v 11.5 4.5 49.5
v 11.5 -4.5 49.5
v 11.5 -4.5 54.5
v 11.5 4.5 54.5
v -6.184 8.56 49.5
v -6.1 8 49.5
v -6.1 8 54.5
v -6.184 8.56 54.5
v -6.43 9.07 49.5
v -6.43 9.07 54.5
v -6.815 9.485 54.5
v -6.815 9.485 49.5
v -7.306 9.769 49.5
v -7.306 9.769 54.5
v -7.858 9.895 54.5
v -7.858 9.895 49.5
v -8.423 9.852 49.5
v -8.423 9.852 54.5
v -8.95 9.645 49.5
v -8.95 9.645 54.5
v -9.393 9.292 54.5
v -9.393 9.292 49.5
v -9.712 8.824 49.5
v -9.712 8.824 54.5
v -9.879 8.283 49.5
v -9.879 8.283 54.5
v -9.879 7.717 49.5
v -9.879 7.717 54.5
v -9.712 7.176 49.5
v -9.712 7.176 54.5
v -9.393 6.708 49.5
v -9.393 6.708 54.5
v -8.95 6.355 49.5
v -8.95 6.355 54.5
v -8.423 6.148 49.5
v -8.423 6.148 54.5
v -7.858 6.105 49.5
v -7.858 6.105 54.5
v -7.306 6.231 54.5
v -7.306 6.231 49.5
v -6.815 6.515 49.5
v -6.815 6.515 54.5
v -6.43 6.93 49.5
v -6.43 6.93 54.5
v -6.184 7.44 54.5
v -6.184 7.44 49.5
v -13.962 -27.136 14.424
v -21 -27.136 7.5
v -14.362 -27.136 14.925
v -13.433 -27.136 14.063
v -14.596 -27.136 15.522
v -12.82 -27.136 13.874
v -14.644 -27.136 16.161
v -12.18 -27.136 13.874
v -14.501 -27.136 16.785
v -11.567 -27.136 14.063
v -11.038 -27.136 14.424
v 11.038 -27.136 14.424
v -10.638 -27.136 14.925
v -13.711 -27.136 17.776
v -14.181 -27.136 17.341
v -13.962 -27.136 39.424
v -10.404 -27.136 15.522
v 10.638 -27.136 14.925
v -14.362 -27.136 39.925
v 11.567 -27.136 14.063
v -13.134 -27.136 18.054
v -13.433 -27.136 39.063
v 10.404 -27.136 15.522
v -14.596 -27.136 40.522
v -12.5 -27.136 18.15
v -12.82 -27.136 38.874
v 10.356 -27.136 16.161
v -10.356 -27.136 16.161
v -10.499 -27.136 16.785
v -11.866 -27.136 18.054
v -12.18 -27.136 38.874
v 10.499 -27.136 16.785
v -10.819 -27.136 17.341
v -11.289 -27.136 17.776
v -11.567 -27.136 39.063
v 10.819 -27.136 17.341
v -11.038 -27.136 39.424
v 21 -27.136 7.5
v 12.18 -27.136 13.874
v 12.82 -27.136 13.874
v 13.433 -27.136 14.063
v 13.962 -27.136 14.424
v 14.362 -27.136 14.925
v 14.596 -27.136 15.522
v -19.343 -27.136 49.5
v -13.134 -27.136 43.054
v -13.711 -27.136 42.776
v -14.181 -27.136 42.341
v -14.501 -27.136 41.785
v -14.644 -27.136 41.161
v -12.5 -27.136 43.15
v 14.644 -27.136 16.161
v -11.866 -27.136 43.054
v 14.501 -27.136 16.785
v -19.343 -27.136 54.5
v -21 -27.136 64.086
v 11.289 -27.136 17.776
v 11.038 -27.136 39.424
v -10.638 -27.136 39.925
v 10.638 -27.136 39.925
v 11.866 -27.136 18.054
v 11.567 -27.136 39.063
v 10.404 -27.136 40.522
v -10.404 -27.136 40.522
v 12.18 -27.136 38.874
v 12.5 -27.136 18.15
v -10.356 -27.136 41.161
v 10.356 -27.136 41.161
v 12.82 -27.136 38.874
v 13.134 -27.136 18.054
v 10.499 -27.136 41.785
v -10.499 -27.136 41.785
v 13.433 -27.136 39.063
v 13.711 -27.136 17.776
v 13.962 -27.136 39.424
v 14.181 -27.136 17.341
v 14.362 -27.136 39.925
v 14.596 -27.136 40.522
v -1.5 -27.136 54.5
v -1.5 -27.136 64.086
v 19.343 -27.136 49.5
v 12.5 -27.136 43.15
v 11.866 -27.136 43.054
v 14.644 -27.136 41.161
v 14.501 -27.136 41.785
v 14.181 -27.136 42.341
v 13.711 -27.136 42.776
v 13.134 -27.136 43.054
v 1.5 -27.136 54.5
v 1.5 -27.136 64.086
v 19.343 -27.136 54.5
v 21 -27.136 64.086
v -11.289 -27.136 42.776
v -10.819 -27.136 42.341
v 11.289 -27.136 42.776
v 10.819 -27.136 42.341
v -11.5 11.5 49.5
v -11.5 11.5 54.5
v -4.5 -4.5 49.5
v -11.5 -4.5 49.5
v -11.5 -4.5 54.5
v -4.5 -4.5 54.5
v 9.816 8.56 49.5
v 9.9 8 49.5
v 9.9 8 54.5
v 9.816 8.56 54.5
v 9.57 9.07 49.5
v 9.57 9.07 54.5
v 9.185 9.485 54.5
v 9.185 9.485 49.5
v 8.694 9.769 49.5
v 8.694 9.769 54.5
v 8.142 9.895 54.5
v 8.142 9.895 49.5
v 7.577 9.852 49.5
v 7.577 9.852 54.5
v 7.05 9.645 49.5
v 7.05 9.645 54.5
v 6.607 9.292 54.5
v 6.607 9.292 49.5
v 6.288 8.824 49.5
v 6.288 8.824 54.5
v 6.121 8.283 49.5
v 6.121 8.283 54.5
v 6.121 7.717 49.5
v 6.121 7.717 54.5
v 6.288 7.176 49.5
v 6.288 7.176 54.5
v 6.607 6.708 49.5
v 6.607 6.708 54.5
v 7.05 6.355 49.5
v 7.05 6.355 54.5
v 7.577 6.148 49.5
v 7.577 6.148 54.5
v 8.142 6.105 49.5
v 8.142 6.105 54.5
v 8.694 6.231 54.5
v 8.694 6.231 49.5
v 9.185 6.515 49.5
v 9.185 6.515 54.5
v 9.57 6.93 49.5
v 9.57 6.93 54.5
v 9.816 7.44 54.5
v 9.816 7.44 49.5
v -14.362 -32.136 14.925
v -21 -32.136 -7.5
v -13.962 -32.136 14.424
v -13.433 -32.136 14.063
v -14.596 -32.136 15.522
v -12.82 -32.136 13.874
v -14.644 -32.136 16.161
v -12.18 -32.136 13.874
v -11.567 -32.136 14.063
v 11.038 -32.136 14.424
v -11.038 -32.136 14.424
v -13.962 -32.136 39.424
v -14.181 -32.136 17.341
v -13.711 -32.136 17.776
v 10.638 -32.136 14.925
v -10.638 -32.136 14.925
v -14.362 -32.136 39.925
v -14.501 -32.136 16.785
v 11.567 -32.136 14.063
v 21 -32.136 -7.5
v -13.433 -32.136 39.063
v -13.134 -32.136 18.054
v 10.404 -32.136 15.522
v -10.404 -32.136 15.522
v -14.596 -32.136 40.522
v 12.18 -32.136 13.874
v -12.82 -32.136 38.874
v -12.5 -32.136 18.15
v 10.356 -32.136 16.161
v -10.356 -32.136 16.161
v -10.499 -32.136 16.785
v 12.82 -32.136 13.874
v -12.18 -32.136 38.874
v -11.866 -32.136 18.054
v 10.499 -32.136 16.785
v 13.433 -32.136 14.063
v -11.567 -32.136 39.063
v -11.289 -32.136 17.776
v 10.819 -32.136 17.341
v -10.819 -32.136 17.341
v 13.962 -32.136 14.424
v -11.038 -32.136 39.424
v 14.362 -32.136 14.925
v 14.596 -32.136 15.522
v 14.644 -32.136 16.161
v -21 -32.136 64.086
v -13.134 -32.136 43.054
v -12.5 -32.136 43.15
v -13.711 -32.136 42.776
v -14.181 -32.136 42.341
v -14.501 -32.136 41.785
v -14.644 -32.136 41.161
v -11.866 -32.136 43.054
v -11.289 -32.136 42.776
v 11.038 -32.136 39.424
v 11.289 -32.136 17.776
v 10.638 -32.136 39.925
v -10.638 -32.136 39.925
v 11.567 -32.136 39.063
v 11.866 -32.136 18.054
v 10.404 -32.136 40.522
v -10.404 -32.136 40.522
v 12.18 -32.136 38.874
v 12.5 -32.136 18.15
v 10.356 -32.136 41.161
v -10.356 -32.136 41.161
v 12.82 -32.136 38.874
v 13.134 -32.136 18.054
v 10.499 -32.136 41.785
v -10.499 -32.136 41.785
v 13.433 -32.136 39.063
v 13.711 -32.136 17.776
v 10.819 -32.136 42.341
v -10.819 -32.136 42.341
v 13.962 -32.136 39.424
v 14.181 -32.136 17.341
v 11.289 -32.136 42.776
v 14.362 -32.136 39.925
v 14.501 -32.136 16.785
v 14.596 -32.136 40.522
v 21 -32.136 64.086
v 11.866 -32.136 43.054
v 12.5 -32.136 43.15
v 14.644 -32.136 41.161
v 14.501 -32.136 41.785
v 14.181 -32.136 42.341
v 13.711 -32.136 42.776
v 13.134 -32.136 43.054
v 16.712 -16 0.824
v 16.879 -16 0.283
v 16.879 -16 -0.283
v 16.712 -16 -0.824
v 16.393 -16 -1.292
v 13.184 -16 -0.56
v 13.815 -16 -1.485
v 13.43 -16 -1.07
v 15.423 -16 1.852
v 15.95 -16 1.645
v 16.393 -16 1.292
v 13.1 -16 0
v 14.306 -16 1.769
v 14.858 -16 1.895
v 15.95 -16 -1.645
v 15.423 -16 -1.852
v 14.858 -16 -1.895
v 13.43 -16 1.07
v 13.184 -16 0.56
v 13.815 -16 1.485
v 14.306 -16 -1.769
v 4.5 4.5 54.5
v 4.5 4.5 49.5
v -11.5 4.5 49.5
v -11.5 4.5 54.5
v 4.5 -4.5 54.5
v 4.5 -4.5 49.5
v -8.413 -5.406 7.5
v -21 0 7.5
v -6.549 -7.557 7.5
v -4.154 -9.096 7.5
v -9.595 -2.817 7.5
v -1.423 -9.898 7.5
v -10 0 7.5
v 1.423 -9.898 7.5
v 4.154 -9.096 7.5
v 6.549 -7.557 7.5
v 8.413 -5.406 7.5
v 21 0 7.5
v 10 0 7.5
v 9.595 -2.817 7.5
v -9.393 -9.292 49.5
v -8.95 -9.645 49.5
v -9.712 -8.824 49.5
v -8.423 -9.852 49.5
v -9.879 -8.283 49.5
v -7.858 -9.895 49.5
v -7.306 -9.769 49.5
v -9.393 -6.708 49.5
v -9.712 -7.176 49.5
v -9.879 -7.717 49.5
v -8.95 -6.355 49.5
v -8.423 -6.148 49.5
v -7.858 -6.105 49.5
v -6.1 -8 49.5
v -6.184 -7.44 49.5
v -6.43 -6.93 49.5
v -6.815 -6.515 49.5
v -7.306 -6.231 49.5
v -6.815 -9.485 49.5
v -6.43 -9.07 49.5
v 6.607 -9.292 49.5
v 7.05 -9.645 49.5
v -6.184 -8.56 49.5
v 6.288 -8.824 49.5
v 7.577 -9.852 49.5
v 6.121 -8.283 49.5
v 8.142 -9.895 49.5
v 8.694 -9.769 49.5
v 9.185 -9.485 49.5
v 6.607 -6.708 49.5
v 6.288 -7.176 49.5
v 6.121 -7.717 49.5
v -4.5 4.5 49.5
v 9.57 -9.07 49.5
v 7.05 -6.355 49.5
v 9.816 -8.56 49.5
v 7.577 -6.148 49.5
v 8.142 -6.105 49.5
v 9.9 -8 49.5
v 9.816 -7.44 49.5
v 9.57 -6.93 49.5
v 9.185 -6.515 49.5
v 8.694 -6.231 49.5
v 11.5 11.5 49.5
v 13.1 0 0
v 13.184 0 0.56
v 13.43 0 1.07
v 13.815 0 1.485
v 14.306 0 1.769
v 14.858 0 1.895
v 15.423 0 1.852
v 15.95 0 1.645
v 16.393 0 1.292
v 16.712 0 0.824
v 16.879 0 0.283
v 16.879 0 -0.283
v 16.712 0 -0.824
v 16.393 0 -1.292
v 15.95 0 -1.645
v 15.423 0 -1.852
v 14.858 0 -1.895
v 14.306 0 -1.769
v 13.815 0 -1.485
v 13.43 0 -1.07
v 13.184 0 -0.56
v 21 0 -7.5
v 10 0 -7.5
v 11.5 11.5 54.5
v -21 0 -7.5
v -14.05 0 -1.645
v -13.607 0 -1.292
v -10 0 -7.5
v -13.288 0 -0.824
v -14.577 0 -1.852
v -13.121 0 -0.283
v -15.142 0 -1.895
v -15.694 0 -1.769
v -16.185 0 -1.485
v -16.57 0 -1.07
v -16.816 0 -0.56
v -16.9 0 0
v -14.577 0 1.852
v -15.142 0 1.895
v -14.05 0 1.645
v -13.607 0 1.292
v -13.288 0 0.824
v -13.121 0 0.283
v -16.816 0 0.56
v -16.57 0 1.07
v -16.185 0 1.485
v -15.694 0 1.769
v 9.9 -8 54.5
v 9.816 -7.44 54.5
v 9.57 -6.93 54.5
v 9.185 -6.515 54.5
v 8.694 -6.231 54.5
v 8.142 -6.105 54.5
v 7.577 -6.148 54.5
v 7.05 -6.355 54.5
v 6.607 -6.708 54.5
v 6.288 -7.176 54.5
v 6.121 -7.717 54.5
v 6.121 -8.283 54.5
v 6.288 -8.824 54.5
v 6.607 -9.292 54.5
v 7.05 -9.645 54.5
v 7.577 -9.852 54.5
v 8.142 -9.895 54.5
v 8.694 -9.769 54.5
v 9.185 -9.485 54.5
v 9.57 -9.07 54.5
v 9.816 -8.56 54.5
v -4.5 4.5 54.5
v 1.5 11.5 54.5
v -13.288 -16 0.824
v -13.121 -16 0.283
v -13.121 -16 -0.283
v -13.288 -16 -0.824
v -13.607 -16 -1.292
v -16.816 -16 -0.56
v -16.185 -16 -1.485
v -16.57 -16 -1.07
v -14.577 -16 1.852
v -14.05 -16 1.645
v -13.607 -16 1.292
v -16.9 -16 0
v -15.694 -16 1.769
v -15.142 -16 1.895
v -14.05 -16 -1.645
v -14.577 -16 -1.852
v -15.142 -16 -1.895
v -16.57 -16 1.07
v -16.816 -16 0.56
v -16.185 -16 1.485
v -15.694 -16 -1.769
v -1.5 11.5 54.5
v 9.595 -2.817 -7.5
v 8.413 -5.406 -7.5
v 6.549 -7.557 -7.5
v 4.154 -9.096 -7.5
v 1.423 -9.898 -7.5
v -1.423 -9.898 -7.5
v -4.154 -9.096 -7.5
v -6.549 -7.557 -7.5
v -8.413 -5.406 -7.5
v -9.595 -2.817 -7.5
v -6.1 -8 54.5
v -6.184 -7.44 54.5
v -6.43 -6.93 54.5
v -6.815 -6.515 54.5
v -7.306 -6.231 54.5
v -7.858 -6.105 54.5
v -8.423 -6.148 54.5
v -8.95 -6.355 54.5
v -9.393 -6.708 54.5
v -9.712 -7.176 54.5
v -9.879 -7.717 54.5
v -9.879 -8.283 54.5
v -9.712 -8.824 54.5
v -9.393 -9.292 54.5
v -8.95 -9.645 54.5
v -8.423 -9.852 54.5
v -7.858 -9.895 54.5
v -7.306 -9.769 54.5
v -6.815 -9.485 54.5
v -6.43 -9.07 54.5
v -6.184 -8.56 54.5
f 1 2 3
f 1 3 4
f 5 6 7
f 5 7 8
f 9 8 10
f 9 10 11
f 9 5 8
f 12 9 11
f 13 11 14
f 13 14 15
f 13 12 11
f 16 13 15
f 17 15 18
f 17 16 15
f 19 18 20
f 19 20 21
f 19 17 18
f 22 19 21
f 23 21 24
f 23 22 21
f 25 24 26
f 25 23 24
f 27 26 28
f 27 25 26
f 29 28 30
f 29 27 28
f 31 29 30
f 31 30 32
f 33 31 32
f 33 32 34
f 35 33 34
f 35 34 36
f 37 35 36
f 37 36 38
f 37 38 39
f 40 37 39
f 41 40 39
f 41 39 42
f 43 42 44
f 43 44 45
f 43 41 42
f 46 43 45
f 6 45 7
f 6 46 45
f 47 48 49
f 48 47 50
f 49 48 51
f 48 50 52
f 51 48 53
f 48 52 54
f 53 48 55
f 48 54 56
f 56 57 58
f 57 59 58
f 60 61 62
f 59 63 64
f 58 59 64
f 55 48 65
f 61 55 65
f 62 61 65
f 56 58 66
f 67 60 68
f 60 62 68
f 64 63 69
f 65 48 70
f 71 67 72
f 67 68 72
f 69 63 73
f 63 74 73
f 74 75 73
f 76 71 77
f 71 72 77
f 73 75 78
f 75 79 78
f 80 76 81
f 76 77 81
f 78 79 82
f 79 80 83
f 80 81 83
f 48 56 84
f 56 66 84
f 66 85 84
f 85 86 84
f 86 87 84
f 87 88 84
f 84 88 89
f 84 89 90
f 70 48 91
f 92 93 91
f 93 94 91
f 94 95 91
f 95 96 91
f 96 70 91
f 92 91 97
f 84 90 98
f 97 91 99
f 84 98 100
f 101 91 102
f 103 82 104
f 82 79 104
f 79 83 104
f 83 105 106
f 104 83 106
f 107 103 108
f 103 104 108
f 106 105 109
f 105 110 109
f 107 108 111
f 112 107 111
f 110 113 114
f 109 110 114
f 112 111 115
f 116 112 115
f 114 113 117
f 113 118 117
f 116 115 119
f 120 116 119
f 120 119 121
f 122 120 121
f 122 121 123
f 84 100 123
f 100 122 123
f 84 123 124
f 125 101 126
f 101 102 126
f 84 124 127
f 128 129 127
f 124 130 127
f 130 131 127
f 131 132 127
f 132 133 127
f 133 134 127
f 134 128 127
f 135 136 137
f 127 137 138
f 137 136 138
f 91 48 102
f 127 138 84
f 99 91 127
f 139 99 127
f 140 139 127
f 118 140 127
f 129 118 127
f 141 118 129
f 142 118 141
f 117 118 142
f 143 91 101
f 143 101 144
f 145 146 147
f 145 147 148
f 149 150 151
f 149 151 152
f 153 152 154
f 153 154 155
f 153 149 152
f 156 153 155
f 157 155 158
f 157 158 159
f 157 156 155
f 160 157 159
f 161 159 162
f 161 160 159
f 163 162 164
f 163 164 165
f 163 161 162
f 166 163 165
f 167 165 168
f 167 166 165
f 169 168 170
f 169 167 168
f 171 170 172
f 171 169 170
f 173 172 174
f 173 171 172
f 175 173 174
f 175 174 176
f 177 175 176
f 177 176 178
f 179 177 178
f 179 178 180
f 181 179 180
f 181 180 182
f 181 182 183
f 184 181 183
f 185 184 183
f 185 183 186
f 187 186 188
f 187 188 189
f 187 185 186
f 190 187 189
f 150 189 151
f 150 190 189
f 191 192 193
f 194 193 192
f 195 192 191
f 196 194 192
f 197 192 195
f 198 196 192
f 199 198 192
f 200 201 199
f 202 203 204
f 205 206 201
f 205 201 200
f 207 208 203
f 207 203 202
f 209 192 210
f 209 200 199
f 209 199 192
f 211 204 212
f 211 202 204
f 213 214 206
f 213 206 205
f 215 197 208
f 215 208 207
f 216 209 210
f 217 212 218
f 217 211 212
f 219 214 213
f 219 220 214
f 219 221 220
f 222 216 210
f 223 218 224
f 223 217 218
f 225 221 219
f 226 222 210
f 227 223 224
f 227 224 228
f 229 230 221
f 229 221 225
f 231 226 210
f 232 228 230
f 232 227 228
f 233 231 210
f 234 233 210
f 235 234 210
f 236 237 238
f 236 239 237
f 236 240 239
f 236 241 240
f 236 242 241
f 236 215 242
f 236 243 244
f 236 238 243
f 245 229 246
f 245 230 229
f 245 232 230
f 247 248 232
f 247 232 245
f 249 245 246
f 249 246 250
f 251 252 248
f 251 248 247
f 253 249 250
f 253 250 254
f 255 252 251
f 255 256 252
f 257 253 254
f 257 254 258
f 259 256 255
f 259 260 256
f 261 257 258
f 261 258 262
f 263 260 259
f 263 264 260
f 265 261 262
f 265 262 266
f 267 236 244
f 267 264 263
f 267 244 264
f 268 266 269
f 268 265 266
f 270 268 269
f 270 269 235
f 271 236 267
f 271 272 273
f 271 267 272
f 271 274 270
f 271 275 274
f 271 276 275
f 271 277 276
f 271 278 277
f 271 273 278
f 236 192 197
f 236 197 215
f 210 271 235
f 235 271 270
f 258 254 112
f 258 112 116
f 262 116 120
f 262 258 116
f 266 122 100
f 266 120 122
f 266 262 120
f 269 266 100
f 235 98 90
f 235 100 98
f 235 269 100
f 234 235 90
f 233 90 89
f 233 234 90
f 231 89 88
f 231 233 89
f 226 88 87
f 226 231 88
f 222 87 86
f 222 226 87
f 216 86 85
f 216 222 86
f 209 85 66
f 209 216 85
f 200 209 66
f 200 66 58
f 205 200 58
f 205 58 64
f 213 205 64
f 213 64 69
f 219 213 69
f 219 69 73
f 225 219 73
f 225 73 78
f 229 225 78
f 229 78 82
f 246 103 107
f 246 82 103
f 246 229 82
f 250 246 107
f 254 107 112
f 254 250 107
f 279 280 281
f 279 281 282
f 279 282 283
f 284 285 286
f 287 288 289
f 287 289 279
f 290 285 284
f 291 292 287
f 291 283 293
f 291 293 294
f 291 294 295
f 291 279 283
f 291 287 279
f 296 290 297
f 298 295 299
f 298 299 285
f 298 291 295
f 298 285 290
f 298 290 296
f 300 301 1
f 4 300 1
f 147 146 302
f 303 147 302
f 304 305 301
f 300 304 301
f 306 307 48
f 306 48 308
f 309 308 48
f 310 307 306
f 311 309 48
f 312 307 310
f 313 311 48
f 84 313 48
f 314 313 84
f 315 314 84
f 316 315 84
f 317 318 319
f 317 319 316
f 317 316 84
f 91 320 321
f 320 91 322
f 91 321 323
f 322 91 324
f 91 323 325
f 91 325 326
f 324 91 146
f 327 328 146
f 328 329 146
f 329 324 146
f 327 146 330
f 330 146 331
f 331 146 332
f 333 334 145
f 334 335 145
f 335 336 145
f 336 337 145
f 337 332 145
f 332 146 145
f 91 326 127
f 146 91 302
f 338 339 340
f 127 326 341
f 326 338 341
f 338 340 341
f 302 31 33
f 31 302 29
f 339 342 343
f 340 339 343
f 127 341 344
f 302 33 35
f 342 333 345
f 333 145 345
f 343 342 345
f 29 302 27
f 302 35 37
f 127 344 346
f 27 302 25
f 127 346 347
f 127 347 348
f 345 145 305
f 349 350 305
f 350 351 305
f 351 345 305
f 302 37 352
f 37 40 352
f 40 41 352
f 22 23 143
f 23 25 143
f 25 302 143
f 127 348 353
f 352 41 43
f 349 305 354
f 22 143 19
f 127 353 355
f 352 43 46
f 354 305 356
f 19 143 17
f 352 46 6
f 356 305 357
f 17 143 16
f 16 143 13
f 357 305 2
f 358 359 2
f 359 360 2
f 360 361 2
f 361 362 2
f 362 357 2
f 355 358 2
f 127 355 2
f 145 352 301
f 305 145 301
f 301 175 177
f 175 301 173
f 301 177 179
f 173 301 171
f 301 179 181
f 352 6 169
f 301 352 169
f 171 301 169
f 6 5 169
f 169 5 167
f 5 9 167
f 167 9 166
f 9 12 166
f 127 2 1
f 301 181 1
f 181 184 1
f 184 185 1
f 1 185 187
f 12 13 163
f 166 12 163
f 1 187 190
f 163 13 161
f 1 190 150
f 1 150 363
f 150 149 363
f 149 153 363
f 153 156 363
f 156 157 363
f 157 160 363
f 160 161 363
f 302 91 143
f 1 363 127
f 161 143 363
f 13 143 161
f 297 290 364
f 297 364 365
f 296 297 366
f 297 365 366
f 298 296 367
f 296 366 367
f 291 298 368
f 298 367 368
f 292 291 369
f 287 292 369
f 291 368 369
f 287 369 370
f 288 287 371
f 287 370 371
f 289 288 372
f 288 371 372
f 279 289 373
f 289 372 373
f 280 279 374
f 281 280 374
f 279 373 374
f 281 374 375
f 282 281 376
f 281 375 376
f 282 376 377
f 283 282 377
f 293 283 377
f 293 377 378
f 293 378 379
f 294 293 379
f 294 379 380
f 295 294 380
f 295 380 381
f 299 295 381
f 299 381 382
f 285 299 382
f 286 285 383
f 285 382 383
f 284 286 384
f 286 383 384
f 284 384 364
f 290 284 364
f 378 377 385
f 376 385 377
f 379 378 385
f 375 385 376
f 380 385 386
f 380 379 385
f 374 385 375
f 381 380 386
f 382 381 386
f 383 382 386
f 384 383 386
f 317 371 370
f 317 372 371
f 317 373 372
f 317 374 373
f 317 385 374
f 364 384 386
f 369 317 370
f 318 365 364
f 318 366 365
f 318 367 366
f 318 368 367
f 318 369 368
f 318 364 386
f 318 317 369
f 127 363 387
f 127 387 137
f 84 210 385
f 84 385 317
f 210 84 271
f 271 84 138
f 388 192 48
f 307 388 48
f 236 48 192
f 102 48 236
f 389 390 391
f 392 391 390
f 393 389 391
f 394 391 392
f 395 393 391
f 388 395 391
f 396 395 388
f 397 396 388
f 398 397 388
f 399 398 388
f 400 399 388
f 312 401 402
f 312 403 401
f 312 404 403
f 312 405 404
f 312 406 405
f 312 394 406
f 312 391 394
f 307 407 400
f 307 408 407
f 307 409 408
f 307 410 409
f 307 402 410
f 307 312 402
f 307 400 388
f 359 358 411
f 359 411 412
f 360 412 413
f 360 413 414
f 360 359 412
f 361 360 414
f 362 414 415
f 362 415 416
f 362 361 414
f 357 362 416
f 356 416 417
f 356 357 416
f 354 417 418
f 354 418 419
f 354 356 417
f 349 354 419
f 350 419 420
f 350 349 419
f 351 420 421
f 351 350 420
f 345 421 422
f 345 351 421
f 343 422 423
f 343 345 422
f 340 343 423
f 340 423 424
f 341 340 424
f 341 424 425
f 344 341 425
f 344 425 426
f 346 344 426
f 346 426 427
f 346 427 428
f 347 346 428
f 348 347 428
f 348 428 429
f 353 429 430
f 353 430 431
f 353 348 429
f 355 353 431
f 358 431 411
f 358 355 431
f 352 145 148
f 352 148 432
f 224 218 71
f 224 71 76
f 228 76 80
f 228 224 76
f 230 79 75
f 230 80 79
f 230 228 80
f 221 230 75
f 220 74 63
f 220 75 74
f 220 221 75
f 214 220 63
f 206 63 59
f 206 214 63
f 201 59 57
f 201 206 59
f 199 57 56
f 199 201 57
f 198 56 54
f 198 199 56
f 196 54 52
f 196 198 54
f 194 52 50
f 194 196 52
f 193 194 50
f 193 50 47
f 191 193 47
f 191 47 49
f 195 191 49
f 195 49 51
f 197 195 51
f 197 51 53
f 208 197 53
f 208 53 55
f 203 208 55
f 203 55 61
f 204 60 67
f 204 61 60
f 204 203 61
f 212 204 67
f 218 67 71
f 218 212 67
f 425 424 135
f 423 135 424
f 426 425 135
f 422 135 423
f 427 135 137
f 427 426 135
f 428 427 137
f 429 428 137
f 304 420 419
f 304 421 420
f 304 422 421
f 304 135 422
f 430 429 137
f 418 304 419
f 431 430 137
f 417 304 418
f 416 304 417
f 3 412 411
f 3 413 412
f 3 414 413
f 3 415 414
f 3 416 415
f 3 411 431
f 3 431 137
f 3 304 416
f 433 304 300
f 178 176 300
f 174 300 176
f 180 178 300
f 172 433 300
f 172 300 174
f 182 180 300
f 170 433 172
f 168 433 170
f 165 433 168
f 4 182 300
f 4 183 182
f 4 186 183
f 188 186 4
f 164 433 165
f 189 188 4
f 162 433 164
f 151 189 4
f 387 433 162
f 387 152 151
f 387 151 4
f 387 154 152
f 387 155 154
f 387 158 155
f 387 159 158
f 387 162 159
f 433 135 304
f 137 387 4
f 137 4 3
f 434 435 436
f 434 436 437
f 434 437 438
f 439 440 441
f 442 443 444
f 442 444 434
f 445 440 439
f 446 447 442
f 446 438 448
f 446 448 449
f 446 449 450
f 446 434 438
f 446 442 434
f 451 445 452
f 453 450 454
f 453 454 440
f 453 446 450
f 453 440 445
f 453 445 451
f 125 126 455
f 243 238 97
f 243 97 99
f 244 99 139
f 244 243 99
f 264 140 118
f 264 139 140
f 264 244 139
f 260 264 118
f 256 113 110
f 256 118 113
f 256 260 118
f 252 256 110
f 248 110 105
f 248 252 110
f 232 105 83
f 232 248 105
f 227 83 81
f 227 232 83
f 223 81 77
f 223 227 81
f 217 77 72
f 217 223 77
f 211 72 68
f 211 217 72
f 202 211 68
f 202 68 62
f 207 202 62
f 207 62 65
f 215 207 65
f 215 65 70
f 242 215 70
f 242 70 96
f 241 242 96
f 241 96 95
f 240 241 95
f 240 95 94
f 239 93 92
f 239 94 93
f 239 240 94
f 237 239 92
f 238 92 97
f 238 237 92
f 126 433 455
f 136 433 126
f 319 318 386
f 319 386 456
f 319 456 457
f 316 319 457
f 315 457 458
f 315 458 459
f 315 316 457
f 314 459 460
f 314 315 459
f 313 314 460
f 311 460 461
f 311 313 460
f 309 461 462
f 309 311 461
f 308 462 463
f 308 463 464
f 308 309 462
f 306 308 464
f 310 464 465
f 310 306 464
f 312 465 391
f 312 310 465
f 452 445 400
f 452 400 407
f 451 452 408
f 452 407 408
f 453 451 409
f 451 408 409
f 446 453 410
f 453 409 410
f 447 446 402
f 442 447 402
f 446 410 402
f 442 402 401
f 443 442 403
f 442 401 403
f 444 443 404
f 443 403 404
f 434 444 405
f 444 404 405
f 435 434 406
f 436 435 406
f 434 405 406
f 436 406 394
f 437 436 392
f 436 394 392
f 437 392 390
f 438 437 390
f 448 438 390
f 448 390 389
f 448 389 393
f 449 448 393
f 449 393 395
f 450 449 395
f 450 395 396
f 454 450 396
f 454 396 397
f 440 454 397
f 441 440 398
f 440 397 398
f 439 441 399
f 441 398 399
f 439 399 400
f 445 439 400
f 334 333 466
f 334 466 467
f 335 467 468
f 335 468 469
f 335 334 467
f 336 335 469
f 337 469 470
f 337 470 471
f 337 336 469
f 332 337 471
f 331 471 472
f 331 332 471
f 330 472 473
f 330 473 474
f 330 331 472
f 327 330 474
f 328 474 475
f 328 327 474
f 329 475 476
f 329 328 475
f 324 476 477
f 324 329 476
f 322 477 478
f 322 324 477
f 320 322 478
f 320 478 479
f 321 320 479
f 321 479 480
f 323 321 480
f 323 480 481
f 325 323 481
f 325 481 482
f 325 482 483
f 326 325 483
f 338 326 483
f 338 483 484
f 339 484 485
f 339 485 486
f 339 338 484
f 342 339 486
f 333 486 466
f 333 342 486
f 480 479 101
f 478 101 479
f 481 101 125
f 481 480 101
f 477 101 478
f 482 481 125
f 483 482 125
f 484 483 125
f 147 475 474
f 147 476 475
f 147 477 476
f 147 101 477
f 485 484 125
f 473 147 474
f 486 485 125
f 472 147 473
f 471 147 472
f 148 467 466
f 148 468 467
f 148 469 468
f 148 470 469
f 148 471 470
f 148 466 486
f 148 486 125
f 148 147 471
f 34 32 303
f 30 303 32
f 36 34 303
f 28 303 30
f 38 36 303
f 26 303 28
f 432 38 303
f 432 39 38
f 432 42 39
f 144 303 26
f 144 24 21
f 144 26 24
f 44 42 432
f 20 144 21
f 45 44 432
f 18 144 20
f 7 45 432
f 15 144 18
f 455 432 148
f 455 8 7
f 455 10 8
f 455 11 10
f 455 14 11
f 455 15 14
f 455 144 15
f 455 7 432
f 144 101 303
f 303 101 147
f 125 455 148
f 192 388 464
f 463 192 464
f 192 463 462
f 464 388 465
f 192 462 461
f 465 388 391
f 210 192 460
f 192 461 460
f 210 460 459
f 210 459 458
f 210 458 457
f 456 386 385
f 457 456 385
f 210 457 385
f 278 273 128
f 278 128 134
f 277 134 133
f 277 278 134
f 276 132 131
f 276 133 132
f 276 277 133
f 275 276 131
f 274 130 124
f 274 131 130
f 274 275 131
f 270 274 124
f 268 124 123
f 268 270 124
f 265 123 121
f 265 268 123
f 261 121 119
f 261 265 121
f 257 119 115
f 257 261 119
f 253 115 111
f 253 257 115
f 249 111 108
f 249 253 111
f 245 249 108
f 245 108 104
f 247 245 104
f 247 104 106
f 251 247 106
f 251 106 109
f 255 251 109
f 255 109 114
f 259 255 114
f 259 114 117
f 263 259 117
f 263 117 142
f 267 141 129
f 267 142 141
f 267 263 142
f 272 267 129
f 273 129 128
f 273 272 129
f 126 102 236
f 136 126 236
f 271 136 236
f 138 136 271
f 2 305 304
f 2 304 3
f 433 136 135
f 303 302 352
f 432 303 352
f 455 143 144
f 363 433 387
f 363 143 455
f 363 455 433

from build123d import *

# Parameters (mm, degrees)
MOTOR_MOUNT_SOLID_DEPTH              = 7.5
ENCODER_DISTANCE_SKETCH_W            = 50
ENCODER_DISTANCE_SKETCH_H            = 57
ENCODER_DISTANCE_SOLID_DEPTH         = 5
ENCODER_MOUNT_SKETCH_R               = 1.9
ENCODER_MOUNT_SKETCH_W               = 7
ENCODER_MOUNT_SKETCH_H               = 9
ENCODER_MOUNT_SOLID_DEPTH            = 5
MOTOR_CLAMP_MOUNTING_HOLES_SKETCH_R  = 1.9
MOTOR_CLAMP_MOUNTING_HOLES_CUT_DEPTH = 16
GUSSET_PLATE_SKETCH_W                = 50
GUSSET_PLATE_SKETCH_H                = 5
GUSSET_PLATE_SOLID_DEPTH             = 16.5
GUSSET_SOLID_DEPTH                   = 1.5
MOUNTING_PLATE_SKETCH_W              = 50
MOUNTING_PLATE_SKETCH_H              = 92
MOUNTING_PLATE_SKETCH_R              = 2.65
MOUNTING_PLATE_SOLID_DEPTH           = 5
MOUNTING_HOLES_CUT_DEPTH             = 101.440280764
MOUNTING_HOLES_CUT_DEPTH_BACK        = 101.440280764
MOUNTING_HOLE_SKETCH_R               = 2.65
MOUNTING_PLATE_TRIM_SKETCH_W         = 50
MOUNTING_PLATE_TRIM_SKETCH_H         = 13.5
MOUNTING_PLATE_TRIM_SKETCH_H_2       = 42
MOUNTING_PLATE_TRIM_SKETCH_W_2       = 23.5
MOUNTING_PLATE_TRIM_SKETCH_H_3       = 16.5
MOUNTING_PLATE_TRIM_CUT_DEPTH        = 2
CUT_EXTRUDE1_DEPTH                   = 102.917859083
CUT_EXTRUDE1_DEPTH_BACK              = 102.917859083
SKETCH2_W                            = 50
SKETCH2_H                            = 120
SKETCH2_W_2                          = 42
SKETCH2_H_2                          = 54.272597004
SKETCH3_W                            = 42
SKETCH3_H                            = 71.586450004
BOSS_EXTRUDE1_DEPTH                  = 5
CUT_EXTRUDE2_DEPTH                   = 78.722819275
CUT_EXTRUDE2_DEPTH_BACK              = 78.722819275
SKETCH4_R                            = 2.15


with BuildPart() as part:
    # Mouting Mount Sketch → Motor Mount Solid (new, symmetric)
    with BuildSketch(Plane.XY):
        with BuildLine():
            Line((-25, -55), (25, -55))
            Line((25, -55), (25, 0))
            Line((25, 0), (10, 0))
            ThreePointArc((10, 0), (0, -10), (-10, 0))
            Line((-10, 0), (-25, 0))
            Line((-25, 0), (-25, -55))
        make_face()
    extrude(amount=MOTOR_MOUNT_SOLID_DEPTH, both=True)

    # Encoder Distance Sketch → Encoder Distance Solid (add)
    with BuildSketch(Plane.XZ.offset(55)):
        with Locations((0, 21)):
            Rectangle(ENCODER_DISTANCE_SKETCH_W, ENCODER_DISTANCE_SKETCH_H)
    extrude(amount=ENCODER_DISTANCE_SOLID_DEPTH)

    # Encoder Mount Sketch → Encoder Mount Solid (add)
    with BuildSketch(Plane.XY.offset(49.5)):
        Polygon((-25, -60), (-25, -55), (-11.5, 11.5), (11.5, 11.5), (25, -55), (25, -60), align=None)
        with Locations((-8, 8)):
            Circle(ENCODER_MOUNT_SKETCH_R, mode=Mode.SUBTRACT)
        with Locations((8, 8)):
            Circle(ENCODER_MOUNT_SKETCH_R, mode=Mode.SUBTRACT)
        with Locations((-8, -8)):
            Circle(ENCODER_MOUNT_SKETCH_R, mode=Mode.SUBTRACT)
        with Locations((8, -8)):
            Circle(ENCODER_MOUNT_SKETCH_R, mode=Mode.SUBTRACT)
        with Locations((-8, 0)):
            Rectangle(ENCODER_MOUNT_SKETCH_W, ENCODER_MOUNT_SKETCH_H, mode=Mode.SUBTRACT)
        with Locations((8, 0)):
            Rectangle(ENCODER_MOUNT_SKETCH_W, ENCODER_MOUNT_SKETCH_H, mode=Mode.SUBTRACT)
    extrude(amount=ENCODER_MOUNT_SOLID_DEPTH)

    # Motor Clamp Mounting Holes Sketch → Motor Clamp Mounting Holes Cut (cut)
    with BuildSketch(Plane(origin=(0, 0, 0), x_dir=(1, 0, 0), z_dir=(0, 1, 0))):
        with Locations(Location((-15, 0, 0), (0, 0, 180))):
            Circle(MOTOR_CLAMP_MOUNTING_HOLES_SKETCH_R)
        with Locations(Location((15, 0, 0), (0, 0, 180))):
            Circle(MOTOR_CLAMP_MOUNTING_HOLES_SKETCH_R)
    extrude(amount=-MOTOR_CLAMP_MOUNTING_HOLES_CUT_DEPTH, mode=Mode.SUBTRACT)

    # Gusset Plate Sketch → Gusset Plate Solid (add)
    with BuildSketch(Plane.XY.offset(54.5)):
        with Locations((0, -57.5)):
            Rectangle(GUSSET_PLATE_SKETCH_W, GUSSET_PLATE_SKETCH_H)
    extrude(amount=GUSSET_PLATE_SOLID_DEPTH)

    # Gusset Sketch → Gusset Solid (add, symmetric)
    with BuildSketch(Plane(origin=(0, 0, 0), x_dir=(0, 0, -1), z_dir=(1, 0, 0))):
        Polygon((-54.5, 11.5), (-71, -55), (-54.5, -55), align=None)
    extrude(amount=GUSSET_SOLID_DEPTH, both=True)

    # Mounting Plate Sketch → Mounting Plate Solid (add)
    with BuildSketch(Plane(origin=(0, -55, 0), x_dir=(1, 0, 0), z_dir=(0, 1, 0))):
        with Locations((0, -25)):
            Rectangle(MOUNTING_PLATE_SKETCH_W, MOUNTING_PLATE_SKETCH_H)
        with Locations((-19, -65)):
            Circle(MOUNTING_PLATE_SKETCH_R, mode=Mode.SUBTRACT)
        with Locations((19, -65)):
            Circle(MOUNTING_PLATE_SKETCH_R, mode=Mode.SUBTRACT)
        with Locations(Location((-19, 15, 0), (0, 0, 270))):
            Circle(MOUNTING_PLATE_SKETCH_R, mode=Mode.SUBTRACT)
        with Locations(Location((19, 15, 0), (0, 0, 270))):
            Circle(MOUNTING_PLATE_SKETCH_R, mode=Mode.SUBTRACT)
    extrude(amount=-MOUNTING_PLATE_SOLID_DEPTH)

    # Mounting Hole Sketch → Mounting Holes Cut (cut, two sides: drawn at the far end of the back side and taken through both)
    with BuildSketch(Plane(origin=(0, -55, 0), x_dir=(1, 0, 0), z_dir=(0, 1, 0)).offset(-MOUNTING_HOLES_CUT_DEPTH_BACK)):
        with Locations(Location((-19, 15, 0), (0, 0, 270))):
            Circle(MOUNTING_HOLE_SKETCH_R)
        with Locations(Location((19, 15, 0), (0, 0, 270))):
            Circle(MOUNTING_HOLE_SKETCH_R)
        with Locations(Location((19, -65, 0), (0, 0, 90))):
            Circle(MOUNTING_HOLE_SKETCH_R)
        with Locations(Location((-19, -65, 0), (0, 0, 90))):
            Circle(MOUNTING_HOLE_SKETCH_R)
    extrude(amount=MOUNTING_HOLES_CUT_DEPTH + MOUNTING_HOLES_CUT_DEPTH_BACK, mode=Mode.SUBTRACT)

    # Mounting Plate Trim Sketch → Mounting Plate Trim Cut (cut)
    with BuildSketch(Plane(origin=(0, -55, 0), x_dir=(1, 0, 0), z_dir=(0, 1, 0))):
        with Locations((0, 14.25)):
            Rectangle(MOUNTING_PLATE_TRIM_SKETCH_W, MOUNTING_PLATE_TRIM_SKETCH_H)
        with Locations((0, -28.5)):
            Rectangle(MOUNTING_PLATE_TRIM_SKETCH_W, MOUNTING_PLATE_TRIM_SKETCH_H_2)
        with Locations((13.25, -62.75)):
            Rectangle(MOUNTING_PLATE_TRIM_SKETCH_W_2, MOUNTING_PLATE_TRIM_SKETCH_H_3)
        with Locations((-13.25, -62.75)):
            Rectangle(MOUNTING_PLATE_TRIM_SKETCH_W_2, MOUNTING_PLATE_TRIM_SKETCH_H_3)
    extrude(amount=-MOUNTING_PLATE_TRIM_CUT_DEPTH, mode=Mode.SUBTRACT)

    # Sketch2 → Cut-Extrude1 (cut, two sides: drawn at the far end of the back side and taken through both)
    with BuildSketch(Plane(origin=(0, 0, -7.5), x_dir=(-1, 0, 0), z_dir=(0, 0, -1)).offset(-CUT_EXTRUDE1_DEPTH_BACK)):
        Rectangle(SKETCH2_W, SKETCH2_H)
        Rectangle(SKETCH2_W_2, SKETCH2_H_2, mode=Mode.SUBTRACT)
    extrude(amount=CUT_EXTRUDE1_DEPTH + CUT_EXTRUDE1_DEPTH_BACK, mode=Mode.SUBTRACT)


with BuildPart() as cut_extrude1_piece_1:
    # of the separate pieces the step leaves, piece 1, a body of its own (cut_extrude1_pieces)
    add(part.part.solids().sort_by_distance((21, 0, 7.5))[0])



with BuildPart() as cut_extrude1_piece_2:
    # of the separate pieces the step leaves, piece 2, a body of its own (cut_extrude1_pieces)
    add(part.part.solids().sort_by_distance((-1.5, -27.136298502, 54.5))[0])


with BuildPart() as cut_extrude1_piece_1_1:
    add(cut_extrude1_piece_1.part)

    add(cut_extrude1_piece_2.part)  # Boss-Extrude1 merges Cut-Extrude1 piece 2
    # Sketch3 → Boss-Extrude1 (add)
    with BuildSketch(Plane.XZ.offset(27.136298502)):
        with Locations((0, 28.293225002)):
            Rectangle(SKETCH3_W, SKETCH3_H)
    extrude(amount=BOSS_EXTRUDE1_DEPTH)

    # Sketch4 → Cut-Extrude2 (cut, two sides: drawn at the far end of the back side and taken through both)
    with BuildSketch(Plane(origin=(0, -27.136298502, 0), x_dir=(1, 0, 0), z_dir=(0, 1, 0)).offset(-CUT_EXTRUDE2_DEPTH_BACK)):
        with Locations(Location((-12.5, -16, 0), (0, 0, 270))):
            Circle(SKETCH4_R)
        with Locations(Location((12.5, -16, 0), (0, 0, 270))):
            Circle(SKETCH4_R)
        with Locations(Location((-12.5, -41, 0), (0, 0, 270))):
            Circle(SKETCH4_R)
        with Locations(Location((12.5, -41, 0), (0, 0, 270))):
            Circle(SKETCH4_R)
    extrude(amount=CUT_EXTRUDE2_DEPTH + CUT_EXTRUDE2_DEPTH_BACK, mode=Mode.SUBTRACT)


solid = cut_extrude1_piece_1_1.part
